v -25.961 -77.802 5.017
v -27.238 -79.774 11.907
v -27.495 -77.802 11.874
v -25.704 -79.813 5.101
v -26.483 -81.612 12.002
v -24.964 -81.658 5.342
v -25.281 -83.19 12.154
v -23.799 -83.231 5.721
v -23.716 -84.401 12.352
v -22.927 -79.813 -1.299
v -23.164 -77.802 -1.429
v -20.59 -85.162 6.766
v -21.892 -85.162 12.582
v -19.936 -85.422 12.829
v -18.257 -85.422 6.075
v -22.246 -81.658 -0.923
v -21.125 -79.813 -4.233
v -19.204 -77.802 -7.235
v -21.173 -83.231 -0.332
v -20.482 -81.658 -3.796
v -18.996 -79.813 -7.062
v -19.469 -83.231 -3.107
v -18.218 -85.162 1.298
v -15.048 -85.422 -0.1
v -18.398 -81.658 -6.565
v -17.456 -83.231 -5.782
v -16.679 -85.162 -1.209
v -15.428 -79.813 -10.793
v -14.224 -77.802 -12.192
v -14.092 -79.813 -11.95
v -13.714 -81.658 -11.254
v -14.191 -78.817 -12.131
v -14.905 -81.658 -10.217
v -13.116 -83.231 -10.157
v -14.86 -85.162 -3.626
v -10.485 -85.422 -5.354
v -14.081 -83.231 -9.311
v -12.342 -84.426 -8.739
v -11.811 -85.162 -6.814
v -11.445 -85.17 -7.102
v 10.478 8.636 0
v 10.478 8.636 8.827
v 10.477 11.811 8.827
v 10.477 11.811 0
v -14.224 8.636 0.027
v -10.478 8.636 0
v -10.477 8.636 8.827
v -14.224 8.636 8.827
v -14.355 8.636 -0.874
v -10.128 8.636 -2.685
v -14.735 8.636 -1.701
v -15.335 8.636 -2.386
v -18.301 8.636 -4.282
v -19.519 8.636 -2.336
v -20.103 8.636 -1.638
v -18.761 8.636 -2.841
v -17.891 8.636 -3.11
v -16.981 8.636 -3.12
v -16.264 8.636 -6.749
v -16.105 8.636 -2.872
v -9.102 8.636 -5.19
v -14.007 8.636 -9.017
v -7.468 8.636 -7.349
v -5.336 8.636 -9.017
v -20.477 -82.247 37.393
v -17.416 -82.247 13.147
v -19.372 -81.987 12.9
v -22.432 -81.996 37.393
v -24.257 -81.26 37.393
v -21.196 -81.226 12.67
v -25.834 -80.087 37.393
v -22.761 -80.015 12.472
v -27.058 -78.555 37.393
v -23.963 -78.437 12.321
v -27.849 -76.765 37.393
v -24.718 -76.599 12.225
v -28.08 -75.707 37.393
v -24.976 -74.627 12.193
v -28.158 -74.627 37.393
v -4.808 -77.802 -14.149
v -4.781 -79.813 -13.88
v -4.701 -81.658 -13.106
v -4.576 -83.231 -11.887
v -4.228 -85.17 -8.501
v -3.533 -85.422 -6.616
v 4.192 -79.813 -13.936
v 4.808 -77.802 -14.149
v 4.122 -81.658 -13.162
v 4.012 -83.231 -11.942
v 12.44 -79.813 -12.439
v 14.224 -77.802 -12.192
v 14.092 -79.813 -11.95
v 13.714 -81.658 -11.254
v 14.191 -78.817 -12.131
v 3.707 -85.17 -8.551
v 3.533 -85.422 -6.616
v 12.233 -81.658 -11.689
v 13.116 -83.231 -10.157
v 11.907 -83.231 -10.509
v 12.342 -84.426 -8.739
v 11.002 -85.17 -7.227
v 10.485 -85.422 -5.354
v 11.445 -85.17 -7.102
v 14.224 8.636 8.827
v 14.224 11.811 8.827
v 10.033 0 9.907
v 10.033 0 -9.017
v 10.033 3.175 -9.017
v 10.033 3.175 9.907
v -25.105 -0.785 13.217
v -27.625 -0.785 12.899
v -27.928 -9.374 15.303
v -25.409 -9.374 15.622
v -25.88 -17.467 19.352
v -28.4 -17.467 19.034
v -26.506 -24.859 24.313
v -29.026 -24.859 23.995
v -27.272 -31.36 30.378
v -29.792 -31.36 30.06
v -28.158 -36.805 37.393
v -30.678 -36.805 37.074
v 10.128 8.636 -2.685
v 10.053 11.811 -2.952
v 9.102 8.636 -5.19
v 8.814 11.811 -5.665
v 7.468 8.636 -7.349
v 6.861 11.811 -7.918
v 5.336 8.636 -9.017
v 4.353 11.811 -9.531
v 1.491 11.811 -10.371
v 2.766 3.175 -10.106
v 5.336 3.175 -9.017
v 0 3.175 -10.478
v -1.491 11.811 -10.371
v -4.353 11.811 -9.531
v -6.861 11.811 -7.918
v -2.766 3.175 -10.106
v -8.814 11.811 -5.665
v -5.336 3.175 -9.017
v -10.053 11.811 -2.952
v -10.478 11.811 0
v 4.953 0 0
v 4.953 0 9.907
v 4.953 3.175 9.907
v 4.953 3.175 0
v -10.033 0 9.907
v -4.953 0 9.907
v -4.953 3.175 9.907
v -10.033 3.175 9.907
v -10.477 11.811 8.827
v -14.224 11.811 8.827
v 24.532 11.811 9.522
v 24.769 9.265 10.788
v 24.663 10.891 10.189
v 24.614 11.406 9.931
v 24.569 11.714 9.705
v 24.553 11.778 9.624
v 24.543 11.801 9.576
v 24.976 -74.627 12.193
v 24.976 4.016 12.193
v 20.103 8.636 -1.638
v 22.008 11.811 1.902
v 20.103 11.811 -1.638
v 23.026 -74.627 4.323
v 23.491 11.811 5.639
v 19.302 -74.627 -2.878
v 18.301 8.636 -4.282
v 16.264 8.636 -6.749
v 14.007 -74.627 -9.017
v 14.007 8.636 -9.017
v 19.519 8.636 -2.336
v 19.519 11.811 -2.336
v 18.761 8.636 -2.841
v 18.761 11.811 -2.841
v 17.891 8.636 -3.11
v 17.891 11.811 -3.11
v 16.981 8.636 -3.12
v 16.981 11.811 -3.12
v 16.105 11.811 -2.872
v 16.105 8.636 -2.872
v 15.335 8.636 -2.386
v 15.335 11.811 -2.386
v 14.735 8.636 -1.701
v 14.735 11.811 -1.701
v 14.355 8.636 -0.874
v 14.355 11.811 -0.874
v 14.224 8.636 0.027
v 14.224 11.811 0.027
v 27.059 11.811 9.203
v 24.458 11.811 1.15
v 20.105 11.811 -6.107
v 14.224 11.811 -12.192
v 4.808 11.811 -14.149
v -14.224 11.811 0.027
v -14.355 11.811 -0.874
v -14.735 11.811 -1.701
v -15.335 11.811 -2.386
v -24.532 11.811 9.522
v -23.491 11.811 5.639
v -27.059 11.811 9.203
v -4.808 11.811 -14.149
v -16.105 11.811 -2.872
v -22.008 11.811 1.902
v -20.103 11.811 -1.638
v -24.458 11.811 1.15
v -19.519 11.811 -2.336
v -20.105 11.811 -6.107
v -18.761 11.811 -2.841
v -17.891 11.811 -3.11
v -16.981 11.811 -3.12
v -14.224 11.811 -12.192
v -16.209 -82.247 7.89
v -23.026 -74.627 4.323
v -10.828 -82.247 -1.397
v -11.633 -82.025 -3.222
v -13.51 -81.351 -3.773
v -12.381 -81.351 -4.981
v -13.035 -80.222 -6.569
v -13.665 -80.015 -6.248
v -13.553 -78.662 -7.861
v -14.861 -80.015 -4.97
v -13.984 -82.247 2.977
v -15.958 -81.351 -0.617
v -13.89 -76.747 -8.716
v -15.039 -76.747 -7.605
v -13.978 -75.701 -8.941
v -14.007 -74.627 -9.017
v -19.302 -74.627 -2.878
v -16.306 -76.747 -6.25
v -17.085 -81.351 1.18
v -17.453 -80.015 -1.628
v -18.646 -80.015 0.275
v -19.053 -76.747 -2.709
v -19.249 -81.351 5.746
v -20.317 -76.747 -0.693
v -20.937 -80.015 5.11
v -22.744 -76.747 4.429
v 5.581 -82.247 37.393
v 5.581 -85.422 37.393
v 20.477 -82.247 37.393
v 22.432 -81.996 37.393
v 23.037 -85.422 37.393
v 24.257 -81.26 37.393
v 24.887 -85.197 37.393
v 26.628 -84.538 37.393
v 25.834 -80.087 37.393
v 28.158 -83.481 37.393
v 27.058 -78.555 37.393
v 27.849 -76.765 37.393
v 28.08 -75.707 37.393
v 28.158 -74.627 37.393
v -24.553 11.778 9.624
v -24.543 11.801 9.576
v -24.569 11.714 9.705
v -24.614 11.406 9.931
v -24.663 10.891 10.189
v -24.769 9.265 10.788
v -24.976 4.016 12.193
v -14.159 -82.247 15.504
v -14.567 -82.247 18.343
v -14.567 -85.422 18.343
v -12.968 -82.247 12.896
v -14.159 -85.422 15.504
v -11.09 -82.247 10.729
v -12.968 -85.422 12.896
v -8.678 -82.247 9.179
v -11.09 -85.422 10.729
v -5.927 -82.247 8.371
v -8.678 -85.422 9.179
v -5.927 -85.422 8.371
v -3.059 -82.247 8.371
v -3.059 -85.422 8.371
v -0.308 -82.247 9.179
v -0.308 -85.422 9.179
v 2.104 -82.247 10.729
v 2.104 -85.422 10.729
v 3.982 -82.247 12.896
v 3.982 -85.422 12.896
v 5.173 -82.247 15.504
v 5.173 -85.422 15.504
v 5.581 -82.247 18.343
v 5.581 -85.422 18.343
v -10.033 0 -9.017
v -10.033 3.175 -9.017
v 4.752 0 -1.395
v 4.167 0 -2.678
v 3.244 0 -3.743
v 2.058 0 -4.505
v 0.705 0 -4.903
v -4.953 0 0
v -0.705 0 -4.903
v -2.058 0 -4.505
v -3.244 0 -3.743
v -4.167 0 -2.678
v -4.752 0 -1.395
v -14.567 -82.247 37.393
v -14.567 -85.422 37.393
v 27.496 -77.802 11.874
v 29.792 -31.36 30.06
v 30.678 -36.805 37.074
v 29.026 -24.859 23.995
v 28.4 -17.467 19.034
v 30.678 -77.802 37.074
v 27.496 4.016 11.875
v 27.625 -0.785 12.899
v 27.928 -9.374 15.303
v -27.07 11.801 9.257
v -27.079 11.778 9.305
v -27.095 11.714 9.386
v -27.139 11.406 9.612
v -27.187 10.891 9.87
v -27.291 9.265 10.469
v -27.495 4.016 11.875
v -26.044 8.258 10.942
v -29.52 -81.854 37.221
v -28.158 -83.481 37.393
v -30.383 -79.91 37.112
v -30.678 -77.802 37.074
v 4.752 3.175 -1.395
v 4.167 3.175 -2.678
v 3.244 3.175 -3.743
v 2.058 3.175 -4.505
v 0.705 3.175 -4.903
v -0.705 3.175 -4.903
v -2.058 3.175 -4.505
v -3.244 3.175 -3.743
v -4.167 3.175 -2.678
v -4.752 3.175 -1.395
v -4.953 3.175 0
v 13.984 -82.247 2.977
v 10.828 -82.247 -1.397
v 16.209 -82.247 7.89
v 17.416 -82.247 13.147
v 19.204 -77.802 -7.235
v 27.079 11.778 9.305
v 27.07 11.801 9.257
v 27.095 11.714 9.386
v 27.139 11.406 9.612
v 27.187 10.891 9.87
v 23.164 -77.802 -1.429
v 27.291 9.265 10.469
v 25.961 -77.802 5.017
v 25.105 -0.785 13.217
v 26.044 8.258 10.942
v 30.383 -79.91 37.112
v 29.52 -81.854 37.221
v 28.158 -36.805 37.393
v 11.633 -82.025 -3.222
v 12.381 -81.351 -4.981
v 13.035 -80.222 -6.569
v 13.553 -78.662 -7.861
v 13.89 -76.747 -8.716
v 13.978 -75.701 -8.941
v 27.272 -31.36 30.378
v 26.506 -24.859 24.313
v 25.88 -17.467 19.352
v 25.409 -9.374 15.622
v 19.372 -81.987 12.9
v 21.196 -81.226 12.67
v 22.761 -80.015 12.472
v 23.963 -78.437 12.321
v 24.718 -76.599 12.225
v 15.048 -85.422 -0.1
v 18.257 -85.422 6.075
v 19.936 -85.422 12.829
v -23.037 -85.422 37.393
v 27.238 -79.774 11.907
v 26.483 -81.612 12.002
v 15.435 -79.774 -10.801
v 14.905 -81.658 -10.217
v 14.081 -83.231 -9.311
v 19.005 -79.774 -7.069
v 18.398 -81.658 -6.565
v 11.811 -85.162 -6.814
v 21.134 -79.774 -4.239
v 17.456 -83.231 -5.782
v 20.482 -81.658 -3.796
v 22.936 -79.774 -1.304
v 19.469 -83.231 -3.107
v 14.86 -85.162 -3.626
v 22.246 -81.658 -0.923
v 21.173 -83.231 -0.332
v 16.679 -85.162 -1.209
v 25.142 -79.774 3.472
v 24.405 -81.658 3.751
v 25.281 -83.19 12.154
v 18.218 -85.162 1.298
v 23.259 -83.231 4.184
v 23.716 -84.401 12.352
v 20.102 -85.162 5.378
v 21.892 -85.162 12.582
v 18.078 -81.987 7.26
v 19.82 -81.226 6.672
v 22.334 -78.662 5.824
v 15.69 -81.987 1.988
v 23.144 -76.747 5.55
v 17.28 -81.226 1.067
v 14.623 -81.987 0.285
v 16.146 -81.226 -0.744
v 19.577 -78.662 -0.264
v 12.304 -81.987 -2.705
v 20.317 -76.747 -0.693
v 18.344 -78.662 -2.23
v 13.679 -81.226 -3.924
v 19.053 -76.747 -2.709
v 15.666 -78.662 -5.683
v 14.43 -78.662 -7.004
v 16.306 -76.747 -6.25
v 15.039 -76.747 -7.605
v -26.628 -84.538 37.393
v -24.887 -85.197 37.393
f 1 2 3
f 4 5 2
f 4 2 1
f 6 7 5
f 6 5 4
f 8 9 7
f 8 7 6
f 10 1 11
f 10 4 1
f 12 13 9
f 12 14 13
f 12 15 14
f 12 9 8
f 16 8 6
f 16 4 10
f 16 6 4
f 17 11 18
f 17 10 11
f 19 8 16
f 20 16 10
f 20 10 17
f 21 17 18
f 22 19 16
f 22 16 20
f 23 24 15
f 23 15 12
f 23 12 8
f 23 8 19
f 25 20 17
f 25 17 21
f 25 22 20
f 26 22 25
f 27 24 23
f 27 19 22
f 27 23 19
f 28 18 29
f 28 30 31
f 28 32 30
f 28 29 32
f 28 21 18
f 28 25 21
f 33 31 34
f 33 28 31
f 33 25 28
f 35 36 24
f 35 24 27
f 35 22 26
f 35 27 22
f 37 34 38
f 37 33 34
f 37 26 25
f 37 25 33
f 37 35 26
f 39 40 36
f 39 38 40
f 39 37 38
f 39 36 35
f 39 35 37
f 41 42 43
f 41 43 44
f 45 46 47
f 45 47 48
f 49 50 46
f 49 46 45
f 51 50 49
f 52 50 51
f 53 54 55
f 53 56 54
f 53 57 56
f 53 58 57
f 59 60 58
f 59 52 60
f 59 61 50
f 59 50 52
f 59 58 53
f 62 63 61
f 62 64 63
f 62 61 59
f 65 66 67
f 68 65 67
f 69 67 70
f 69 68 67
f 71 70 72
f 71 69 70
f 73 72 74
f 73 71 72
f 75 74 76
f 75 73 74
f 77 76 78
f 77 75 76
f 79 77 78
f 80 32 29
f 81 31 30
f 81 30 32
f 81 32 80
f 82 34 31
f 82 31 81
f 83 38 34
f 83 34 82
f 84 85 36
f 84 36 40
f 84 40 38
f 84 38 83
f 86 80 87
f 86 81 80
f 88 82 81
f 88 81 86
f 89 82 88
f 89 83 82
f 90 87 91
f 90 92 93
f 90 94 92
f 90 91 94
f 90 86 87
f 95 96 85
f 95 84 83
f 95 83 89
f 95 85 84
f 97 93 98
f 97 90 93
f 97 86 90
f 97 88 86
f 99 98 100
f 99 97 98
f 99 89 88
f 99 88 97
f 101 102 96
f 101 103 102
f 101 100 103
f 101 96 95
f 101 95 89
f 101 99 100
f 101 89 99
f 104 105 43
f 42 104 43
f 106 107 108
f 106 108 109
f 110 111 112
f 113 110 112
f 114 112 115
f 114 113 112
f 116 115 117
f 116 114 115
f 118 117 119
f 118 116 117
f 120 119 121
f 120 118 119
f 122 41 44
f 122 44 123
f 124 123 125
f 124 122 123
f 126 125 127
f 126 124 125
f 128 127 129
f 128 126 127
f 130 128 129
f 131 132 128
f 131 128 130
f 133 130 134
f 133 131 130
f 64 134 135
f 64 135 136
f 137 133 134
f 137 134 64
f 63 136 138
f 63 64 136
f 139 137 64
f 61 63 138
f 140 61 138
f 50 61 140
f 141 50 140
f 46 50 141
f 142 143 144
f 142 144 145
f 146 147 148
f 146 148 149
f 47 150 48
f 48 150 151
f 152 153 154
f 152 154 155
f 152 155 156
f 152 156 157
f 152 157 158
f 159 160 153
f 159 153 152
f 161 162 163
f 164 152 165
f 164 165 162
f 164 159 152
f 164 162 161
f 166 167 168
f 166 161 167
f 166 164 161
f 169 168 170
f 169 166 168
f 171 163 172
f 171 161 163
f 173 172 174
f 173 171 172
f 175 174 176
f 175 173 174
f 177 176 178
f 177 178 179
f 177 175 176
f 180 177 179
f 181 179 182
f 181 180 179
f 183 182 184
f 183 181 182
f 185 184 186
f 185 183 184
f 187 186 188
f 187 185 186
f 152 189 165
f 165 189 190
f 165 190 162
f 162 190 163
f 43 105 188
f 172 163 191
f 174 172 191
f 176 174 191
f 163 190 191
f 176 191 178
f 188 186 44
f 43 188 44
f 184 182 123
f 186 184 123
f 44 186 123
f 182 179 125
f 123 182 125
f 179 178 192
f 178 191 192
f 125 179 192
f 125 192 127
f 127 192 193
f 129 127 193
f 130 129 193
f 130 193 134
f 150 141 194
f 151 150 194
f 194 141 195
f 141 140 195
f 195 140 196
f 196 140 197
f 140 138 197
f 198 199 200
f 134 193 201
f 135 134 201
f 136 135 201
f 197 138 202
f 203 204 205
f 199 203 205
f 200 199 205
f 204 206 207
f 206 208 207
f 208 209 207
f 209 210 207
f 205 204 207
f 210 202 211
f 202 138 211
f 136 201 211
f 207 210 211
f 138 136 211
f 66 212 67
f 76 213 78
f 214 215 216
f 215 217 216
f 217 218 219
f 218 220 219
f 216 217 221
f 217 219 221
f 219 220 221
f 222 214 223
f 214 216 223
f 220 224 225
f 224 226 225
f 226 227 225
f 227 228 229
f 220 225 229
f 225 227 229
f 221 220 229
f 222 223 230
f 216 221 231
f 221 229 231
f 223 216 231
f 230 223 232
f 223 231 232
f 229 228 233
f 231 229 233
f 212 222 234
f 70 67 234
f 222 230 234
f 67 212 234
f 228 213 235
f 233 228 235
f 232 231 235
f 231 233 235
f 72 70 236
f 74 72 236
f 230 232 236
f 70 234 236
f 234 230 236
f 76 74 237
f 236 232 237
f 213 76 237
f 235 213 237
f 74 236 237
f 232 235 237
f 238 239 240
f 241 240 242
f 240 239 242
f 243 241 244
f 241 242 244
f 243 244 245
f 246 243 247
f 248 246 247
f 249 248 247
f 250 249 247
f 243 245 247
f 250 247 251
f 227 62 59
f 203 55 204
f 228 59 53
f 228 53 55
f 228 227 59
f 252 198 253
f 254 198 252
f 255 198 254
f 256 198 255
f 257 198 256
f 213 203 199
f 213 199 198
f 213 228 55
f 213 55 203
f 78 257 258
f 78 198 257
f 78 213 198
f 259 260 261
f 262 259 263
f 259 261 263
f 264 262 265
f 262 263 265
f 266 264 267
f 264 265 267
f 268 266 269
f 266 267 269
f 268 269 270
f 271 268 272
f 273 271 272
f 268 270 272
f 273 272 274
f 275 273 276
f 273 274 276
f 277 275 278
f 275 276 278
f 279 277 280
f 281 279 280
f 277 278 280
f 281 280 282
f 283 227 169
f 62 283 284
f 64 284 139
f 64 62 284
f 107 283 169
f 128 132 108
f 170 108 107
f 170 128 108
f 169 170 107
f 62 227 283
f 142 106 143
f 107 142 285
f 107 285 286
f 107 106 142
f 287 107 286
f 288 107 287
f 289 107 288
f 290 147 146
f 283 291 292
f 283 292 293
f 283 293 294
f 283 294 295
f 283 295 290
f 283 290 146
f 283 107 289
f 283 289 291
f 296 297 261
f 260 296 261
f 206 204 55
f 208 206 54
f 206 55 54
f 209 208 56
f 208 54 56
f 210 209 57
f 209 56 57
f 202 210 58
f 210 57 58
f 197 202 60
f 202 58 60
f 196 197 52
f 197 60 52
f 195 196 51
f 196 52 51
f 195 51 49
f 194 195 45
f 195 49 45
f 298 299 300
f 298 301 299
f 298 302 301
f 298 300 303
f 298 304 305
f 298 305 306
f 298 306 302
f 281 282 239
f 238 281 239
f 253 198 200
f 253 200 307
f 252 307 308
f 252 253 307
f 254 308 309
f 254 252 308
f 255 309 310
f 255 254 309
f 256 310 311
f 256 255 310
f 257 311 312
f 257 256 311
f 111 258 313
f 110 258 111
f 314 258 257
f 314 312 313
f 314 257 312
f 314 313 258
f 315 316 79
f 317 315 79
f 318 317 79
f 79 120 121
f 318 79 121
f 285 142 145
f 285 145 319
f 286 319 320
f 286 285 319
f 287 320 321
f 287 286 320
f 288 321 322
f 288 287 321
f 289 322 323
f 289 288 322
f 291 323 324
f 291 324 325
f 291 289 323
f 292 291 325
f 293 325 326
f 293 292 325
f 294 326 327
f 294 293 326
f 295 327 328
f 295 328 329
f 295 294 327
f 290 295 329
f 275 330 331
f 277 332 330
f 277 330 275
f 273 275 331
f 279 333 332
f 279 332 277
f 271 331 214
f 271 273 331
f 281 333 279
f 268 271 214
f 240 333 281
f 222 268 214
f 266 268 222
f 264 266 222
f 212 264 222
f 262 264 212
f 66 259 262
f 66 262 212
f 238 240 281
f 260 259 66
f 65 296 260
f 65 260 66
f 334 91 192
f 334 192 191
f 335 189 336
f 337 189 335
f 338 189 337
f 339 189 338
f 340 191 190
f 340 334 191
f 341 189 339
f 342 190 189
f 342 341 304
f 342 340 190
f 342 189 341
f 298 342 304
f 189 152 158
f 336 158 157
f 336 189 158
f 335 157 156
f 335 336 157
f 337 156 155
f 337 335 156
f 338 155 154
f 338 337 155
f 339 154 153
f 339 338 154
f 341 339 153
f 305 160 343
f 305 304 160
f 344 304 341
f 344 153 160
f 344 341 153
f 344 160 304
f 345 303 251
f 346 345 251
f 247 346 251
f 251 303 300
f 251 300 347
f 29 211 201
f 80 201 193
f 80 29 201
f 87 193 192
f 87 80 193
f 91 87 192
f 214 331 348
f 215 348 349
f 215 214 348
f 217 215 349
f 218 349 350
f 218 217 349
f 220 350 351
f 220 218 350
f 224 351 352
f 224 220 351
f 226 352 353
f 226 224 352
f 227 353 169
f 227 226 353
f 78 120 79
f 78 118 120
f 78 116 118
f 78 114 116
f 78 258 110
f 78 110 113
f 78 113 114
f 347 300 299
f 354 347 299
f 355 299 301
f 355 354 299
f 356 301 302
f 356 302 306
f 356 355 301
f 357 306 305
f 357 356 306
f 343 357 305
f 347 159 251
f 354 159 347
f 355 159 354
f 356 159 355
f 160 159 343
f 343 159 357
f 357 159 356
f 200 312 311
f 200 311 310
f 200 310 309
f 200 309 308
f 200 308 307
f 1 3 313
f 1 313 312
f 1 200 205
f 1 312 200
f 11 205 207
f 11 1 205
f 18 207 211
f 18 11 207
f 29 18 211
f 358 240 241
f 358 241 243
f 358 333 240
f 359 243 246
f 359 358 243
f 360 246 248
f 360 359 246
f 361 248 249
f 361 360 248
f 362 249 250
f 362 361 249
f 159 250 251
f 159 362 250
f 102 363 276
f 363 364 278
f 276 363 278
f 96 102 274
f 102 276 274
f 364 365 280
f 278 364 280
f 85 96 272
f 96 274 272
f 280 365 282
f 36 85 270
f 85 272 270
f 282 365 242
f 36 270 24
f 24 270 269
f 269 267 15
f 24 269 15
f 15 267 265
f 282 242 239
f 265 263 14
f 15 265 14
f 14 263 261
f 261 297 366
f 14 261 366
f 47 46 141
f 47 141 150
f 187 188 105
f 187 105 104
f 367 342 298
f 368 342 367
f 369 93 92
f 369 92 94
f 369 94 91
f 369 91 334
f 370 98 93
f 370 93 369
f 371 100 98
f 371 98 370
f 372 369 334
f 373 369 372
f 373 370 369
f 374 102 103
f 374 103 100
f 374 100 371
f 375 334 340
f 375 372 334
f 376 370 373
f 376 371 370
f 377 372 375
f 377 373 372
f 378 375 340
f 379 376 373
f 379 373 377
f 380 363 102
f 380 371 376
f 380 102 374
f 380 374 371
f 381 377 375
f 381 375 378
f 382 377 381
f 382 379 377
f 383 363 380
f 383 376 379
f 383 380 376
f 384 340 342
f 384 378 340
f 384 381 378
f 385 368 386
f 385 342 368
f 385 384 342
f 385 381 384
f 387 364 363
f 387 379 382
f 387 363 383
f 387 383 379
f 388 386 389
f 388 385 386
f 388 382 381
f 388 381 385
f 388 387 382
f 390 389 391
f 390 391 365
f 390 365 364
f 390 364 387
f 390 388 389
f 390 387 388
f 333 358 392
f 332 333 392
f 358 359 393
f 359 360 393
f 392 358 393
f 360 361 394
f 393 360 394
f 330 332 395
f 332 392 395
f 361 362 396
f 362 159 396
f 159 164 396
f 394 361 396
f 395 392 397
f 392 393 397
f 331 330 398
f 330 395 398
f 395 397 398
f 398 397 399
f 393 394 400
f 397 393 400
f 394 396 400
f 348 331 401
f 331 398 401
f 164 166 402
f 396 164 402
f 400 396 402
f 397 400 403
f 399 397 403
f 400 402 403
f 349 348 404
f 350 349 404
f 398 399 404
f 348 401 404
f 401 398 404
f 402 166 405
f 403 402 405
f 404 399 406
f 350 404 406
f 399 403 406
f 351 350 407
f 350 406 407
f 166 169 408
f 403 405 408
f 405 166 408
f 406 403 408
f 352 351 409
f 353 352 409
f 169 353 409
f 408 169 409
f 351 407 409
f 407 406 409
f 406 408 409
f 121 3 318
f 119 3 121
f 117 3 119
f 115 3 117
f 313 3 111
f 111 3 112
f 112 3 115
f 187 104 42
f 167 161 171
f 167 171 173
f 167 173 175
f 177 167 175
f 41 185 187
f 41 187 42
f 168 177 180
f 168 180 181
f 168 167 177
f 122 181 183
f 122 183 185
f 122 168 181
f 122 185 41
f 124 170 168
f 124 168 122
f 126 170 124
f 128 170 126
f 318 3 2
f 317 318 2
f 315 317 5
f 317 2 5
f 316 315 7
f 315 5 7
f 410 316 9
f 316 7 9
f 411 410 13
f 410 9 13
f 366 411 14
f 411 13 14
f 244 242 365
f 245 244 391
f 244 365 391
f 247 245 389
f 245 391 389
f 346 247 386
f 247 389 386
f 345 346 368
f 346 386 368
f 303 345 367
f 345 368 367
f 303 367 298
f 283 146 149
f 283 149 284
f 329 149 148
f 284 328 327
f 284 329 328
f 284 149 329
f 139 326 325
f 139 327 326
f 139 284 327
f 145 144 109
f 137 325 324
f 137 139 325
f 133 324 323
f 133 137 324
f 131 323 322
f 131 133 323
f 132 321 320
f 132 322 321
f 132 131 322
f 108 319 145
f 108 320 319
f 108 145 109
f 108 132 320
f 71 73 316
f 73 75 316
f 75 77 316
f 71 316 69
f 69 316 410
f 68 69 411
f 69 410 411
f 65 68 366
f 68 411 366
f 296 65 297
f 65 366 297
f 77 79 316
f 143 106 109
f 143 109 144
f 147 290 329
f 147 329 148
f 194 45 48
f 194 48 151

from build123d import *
from build123d.topology import SkipClean

# Parameters (mm, degrees)
BOSS_EXTRUDE1_DEPTH     = 3.175
BOSS_EXTRUDE2_DEPTH     = 3.175
BOSS_EXTRUDE3_DEPTH     = 21.0185
CUT_EXTRUDE1_START      = -8.636
CUT_EXTRUDE1_DEPTH      = 8.636
EXTRUDE_THIN2_START     = -97.232746
EXTRUDE_THIN2_DEPTH     = 97.232746
FILLET3_R               = 3.175
BOSS_EXTRUDE6_DEPTH     = 3.175
BOSS_EXTRUDE7_DEPTH     = 25.4
BOSS_EXTRUDE8_DEPTH     = 25.4
CUT_EXTRUDE2_START      = -2.540011
CUT_EXTRUDE2_DEPTH      = 2.540011
CUT_EXTRUDE3_DEPTH      = 111.05910553505677
CUT_EXTRUDE3_DEPTH_BACK = 10.921999999999981
BOSS_EXTRUDE10_DEPTH    = 3.175
CUT_EXTRUDE6_DEPTH      = 3.175
FILLET9_R               = 7.62
FILLET10_R              = 7.62


with BuildPart() as part:
    # Sketch1 → Boss-Extrude1 (new body)
    with BuildSketch(Plane(origin=(0, 0, 0), x_dir=(1, 0, 0), z_dir=(0, 1, 0))):
        with BuildLine():
            Line((-7.493000000000001, 9.017), (7.493000000000001, 9.017))
            Line((7.493000000000001, 9.017), (10.033000000000001, 9.017))
            Line((10.033000000000001, 9.017), (10.033000000000003, -9.907244149147685))
            Line((10.033000000000003, -9.907244149147685), (7.493000000000001, -9.907244149147685))
            Line((7.493000000000001, -9.907244149147685), (4.953000000000001, -9.907244149147685))
            Line((4.953000000000001, -9.907244149147685), (4.953000000000001, -7.493000000000001))
            Line((4.953000000000001, -7.493000000000001), (4.953000000000002, 0))
            ThreePointArc((4.953000000000002, 0), (3e-16, 4.953000000000002), (-4.953000000000002, 0))
            Line((-4.953000000000002, 0), (-4.953000000000002, -7.493000000000001))
            Line((-4.953000000000002, -7.493000000000001), (-4.953000000000002, -9.907244149147685))
            Line((-4.953000000000002, -9.907244149147685), (-7.493000000000001, -9.907244149147685))
            Line((-7.493000000000001, -9.907244149147685), (-10.033, -9.907244149147685))
            Line((-10.033, -9.907244149147685), (-10.033, 9.017))
            Line((-10.033, 9.017), (-7.493000000000001, 9.017))
        make_face()
    extrude(amount=BOSS_EXTRUDE1_DEPTH)

    # Sketch2 → Boss-Extrude2 (add)
    with BuildSketch(Plane(origin=(0, 0, -9.017), x_dir=(-1, 0, 0), z_dir=(0, 0, -1))):
        Polygon((-14.224, 11.811000000000002), (14.224, 11.810999999999998), (14.224000000000013, -85.42174573001641), (-14.224, -85.42174573001641), align=None)
    extrude(amount=BOSS_EXTRUDE2_DEPTH)

    # Sketch6 → Boss-Extrude3 (add)
    with BuildSketch(Plane.XY.offset(-12.191999999999998)):
        Polygon((-14.224000000000013, 11.810999999999998), (14.224000000000002, 11.811000000000002), (14.224000000000002, 8.635999999999997), (-14.224000000000013, 8.636), align=None)
    extrude(amount=BOSS_EXTRUDE3_DEPTH)

    # Sketch7 → Cut-Extrude1 (cut)
    with BuildSketch(Plane(origin=(-1.44e-15, 11.811, 0), x_dir=(1, 1.2e-16, -1.2e-16), z_dir=(-1.2e-16, 1, 0)).offset(CUT_EXTRUDE1_START)):
        with BuildLine():
            Line((-10.4775, 0), (-10.477499999999997, -8.826500000000003))
            Line((-10.477499999999997, -8.826500000000003), (10.477499999999997, -8.826500000000003))
            Line((10.477499999999997, -8.826500000000003), (10.4775, 0))
            ThreePointArc((10.4775, 0), (6.4e-16, 10.4775), (-10.4775, 0))
        make_face()
    extrude(amount=CUT_EXTRUDE1_DEPTH, mode=Mode.SUBTRACT)

    # Sketch9 → Extrude-Thin2 (add)
    with SkipClean():  # the faces are left unmerged after this step: merging them gives an invalid solid
        with BuildSketch(Plane(origin=(-1.44e-15, 11.811, 0), x_dir=(1, 1.2e-16, 0), z_dir=(-1.2e-16, 1, 0)).offset(EXTRUDE_THIN2_START)):
            with BuildLine():
                ThreePointArc((-27.495499999999996, -11.874500000000001), (-23.16361739518542, 1.4292204105375994), (-14.223999999999998, 12.191999999999998))
                ThreePointArc((-14.223999999999998, 12.191999999999998), (5.6e-15, 14.3950225515744), (14.224000000000002, 12.191999999999998))
                ThreePointArc((14.224000000000002, 12.191999999999998), (23.163617395185135, 1.4292204105374466), (27.495500000000003, -11.874500000000001))
                Line((27.495500000000003, -11.874500000000001), (24.975514198736292, -12.192731930247863))
                ThreePointArc((24.975514198736292, -12.192731930247863), (21.05665610983997, -0.0117588049320041), (12.985378631165648, 9.917391957485702))
                ThreePointArc((12.985378631165648, 9.917391957485702), (-2.419e-14, 11.8550225515744), (-12.985378631165693, 9.917391957485693))
                ThreePointArc((-12.985378631165693, 9.917391957485693), (-21.05665610984024, -0.01175880493180514), (-24.97551419873627, -12.192731930247744))
                Line((-24.97551419873627, -12.192731930247744), (-27.495499999999996, -11.874500000000001))
            make_face()
        extrude(amount=EXTRUDE_THIN2_DEPTH)

    # Fillet3
    fillet3_edges = [part.edges().sort_by_distance(p)[0] for p in [
        (14.223999999999988, 10.223500000000001, -8.81669380630742),
        (-14.224000000000025, 10.223500000000001, -8.81669380630752),
    ]]
    fillet(fillet3_edges, radius=FILLET3_R)

    # Sketch14 → Boss-Extrude6 (add)
    with SkipClean():  # the faces are left unmerged after this step: merging them gives an invalid solid
        with BuildSketch(Plane.XZ.offset(85.42174573001641)):
            with BuildLine():
                Line((-24.97551419873624, 12.192731930247724), (24.975514198736285, 12.19273193024785))
                ThreePointArc((24.975514198736285, 12.19273193024785), (21.375415433357674, 0.6135941010343018), (14.007321972391798, -9.017000000000001))
                Line((14.007321972391798, -9.017000000000001), (-14.007321972391907, -9.017000000000001))
                ThreePointArc((-14.007321972391907, -9.017000000000001), (-21.3754154333579, 0.613594101034149), (-24.97551419873624, 12.192731930247724))
            make_face()
        extrude(amount=-BOSS_EXTRUDE6_DEPTH)

    # Sketch16 → Boss-Extrude7 (add)
    with SkipClean():  # the faces are left unmerged after this step: merging them gives an invalid solid
        with BuildSketch(Plane(origin=(-1.907611771170577, -2.3e-16, 15.10582100900744), x_dir=(0.9921203941983182, 1.3600232051658164e-15, 0.125288161514861), z_dir=(-0.125288161514861, 0, 0.9921203941983182))):
            Polygon((-25.79111202477162, 11.811000000000032), (-23.25111202477174, 11.811000000000032), (-23.25111202477173, -85.42174573001638), (-25.791112024771614, -85.42174573001638), align=None)
        extrude(amount=BOSS_EXTRUDE7_DEPTH)

    # Sketch17 → Boss-Extrude8 (add)
    with SkipClean():  # the faces are left unmerged after this step: merging them gives an invalid solid
        with BuildSketch(Plane(origin=(1.9076117711714262, 2.3e-16, 15.105821009008544), x_dir=(0.9921203941983123, 0, -0.12528816151490688), z_dir=(0.12528816151490688, 0, 0.9921203941983123))):
            Polygon((23.251112024770936, 11.811000000000003), (25.791112024770936, 11.811000000000003), (25.791112024770946, -85.42174573001641), (23.251112024770947, -85.42174573001641), align=None)
        extrude(amount=BOSS_EXTRUDE8_DEPTH)

    # Sketch18 → Cut-Extrude2 (cut)
    with SkipClean():  # the faces are left unmerged after this step: merging them gives an invalid solid
        with BuildSketch(Plane(origin=(25.587888228828575, 2.68e-15, -3.2313210090085582), x_dir=(-0.12528816151490693, 0, -0.9921203941983123), z_dir=(0.9921203941983123, 0, -0.12528816151490693)).offset(CUT_EXTRUDE2_START)):
            with BuildLine():
                Line((-15.225794265840976, 11.811000000000003), (-40.62579426584097, 11.810999999999979))
                Line((-40.62579426584097, 11.810999999999979), (-40.625794265840945, -36.80537286500823))
                ThreePointArc((-40.625794265840945, -36.80537286500823), (-21.550219024017473, -15.828155025985357), (-15.225794265840976, 11.811000000000003))
            make_face()
        extrude(amount=CUT_EXTRUDE2_DEPTH, mode=Mode.SUBTRACT)

    # Sketch20 → Cut-Extrude3 (cut, two sides: drawn at the far end of the back side and taken through both)
    with SkipClean():  # the faces are left unmerged after this step: merging them gives an invalid solid
        with BuildSketch(Plane(origin=(-25.58788822882942, -3.721e-14, -3.2313210090074618), x_dir=(-0.125288161514861, 0, 0.9921203941983182), z_dir=(-0.9921203941983182, -1.4485191631463195e-15, -0.125288161514861)).offset(-CUT_EXTRUDE3_DEPTH_BACK)):
            with BuildLine():
                Line((22.0274881860901, 227.29057678360587), (15.225794265839772, 11.811000000000037))
                ThreePointArc((15.225794265839772, 11.811000000000037), (21.550219024016272, -15.828155025985314), (40.62579426583977, -36.8053728650082))
                Line((40.62579426583977, -36.8053728650082), (221.38768427622742, -154.29090461636542))
                Line((221.38768427622742, -154.29090461636542), (603.5471555949496, 45.37126677696938))
                Line((603.5471555949496, 45.37126677696938), (404.18695950481225, 426.95274817694064))
                Line((404.18695950481225, 426.95274817694064), (22.0274881860901, 227.29057678360587))
            make_face()
        extrude(amount=CUT_EXTRUDE3_DEPTH + CUT_EXTRUDE3_DEPTH_BACK, mode=Mode.SUBTRACT)

    # Fillet4
    # an asymmetric fillet: 13.335, 3.81 mm, written as the material it takes off along each edge
    with BuildSketch(Plane(origin=(58.84302061341704, 11.811000000000007, 7.915834047084794), x_dir=(-0.12528816151490632, 0, -0.9921203941983124), z_dir=(-0.9921203941983124, 0, 0.12528816151490632))) as fillet4_piece_1:
        with BuildLine():
            Bezier((2.7053520070494255, 0), (1.4569009522956595, 0), (-1.0323629375475052, 12.596361392197306), weights=[1, 0.7726151697313755, 1])
            ThreePointArc((-1.0323629375475052, 12.596361392197306), (-0.15891459016591844, 6.327461301251529), (0, 0))
            Line((0, 0), (2.7053520070494255, 0))
        make_face()
    extrude(amount=65.73297697483088, mode=Mode.SUBTRACT)
    with BuildSketch(Plane(origin=(6.372006414680967, 11.811, 16.151397883161476), x_dir=(0.12528816151485953, 0, -0.9921203941983183), z_dir=(-0.9921203941983183, 0, -0.12528816151485953))) as fillet4_piece_2:
        with BuildLine():
            Bezier((2.7053520070494144, 0), (1.4569009522956617, 0), (-1.0323629375475112, 12.596361392197299), weights=[1, 0.7726151697313756, 1])
            ThreePointArc((-1.0323629375475112, 12.596361392197299), (-0.1589145901659224, 6.327461301251536), (0, 0))
            Line((0, 0), (2.7053520070494144, 0))
        make_face()
    extrude(amount=65.7329769748309, mode=Mode.SUBTRACT)

    # Sketch24 → Boss-Extrude10 (add)
    with SkipClean():  # the faces are left unmerged after this step: merging them gives an invalid solid
        with BuildSketch(Plane.XZ.offset(85.42174573001641)):
            Polygon((-28.15783350121368, 37.39258994288504), (28.157833501214938, 37.392589942884996), (24.975514198736303, 12.192731930247856), (-24.975514198736246, 12.192731930247751), align=None)
        extrude(amount=-BOSS_EXTRUDE10_DEPTH)

    # Sketch26 → Cut-Extrude6 (cut)
    with SkipClean():  # the faces are left unmerged after this step: merging them gives an invalid solid
        with BuildSketch(Plane.XZ.offset(85.42174573001641)):
            with BuildLine():
                Line((-14.567389511213682, 37.392589942884996), (-14.56738951121368, 18.342589942884995))
                ThreePointArc((-14.56738951121368, 18.342589942884995), (-13.658413539575372, 14.16066011195614), (-11.095512732064424, 10.733370529984954))
                ThreePointArc((-11.095512732064424, 10.733370529984954), (-0.31106002656321863, 9.177166260801702), (5.581409796229526, 18.342589942884995))
                Line((5.581409796229526, 18.342589942884995), (5.581409796229526, 37.392589942884996))
                Line((5.581409796229526, 37.392589942884996), (-14.567389511213682, 37.392589942884996))
            make_face()
        extrude(amount=-CUT_EXTRUDE6_DEPTH, mode=Mode.SUBTRACT)

    # Fillet9
    # the kernel refuses this fillet: 7.62 mm, written as the material it takes off along each edge
    with BuildSketch(Plane(origin=(-27.49549999999986, -85.42174573001641, 11.8745), x_dir=(-1.4e-15, 1, -2.2e-16), z_dir=(-0.12528816151486097, 0, 0.9921203941983181))) as fillet9_piece_1:
        with BuildLine():
            CenterArc((FILLET9_R, -FILLET9_R), FILLET9_R, 90.00000000000003, 90)
            Line((3.41e-15, -FILLET9_R), (0, 0))
            Line((0, 0), (FILLET9_R, 0))
        make_face()
    extrude(amount=44.45000000000002, mode=Mode.SUBTRACT)
    with BuildSketch(Plane(origin=(9.413541961032127, -85.42174600000001, 16.535492796453063), x_dir=(-0.9921203941983183, 0, -0.12528816151485989), z_dir=(-0.12528816151485989, 0, 0.9921203941983183))) as fillet9_piece_2:
        with BuildLine():
            CenterArc((37.20218047816306 - FILLET9_R, -FILLET9_R), FILLET9_R, 0, 89.99999999999997)
            Line((37.20218047816306 - FILLET9_R, 0), (37.20218047816306, 0))
            Line((37.20218047816306, 0), (37.20218047816306, -FILLET9_R))
        make_face()
    revolve(axis=Axis((9.413541961032127, -85.42174600000001, 16.535492796453063), (1.2e-16, -1, 0)), revolution_arc=72.69638640364694, mode=Mode.SUBTRACT)
    with BuildSketch(Plane(origin=(1.219e-14, -85.42174600000001, 32.62571362170871), x_dir=(-0.6537161623893962, 0, -0.7567398357631774), z_dir=(-0.7567398357631774, 0, 0.6537161623893962))) as fillet9_piece_3:
        with BuildLine():
            CenterArc((47.020736173283105 - FILLET9_R, -FILLET9_R), FILLET9_R, 0, 90.00000000000006)
            Line((47.020736173283105 - FILLET9_R, 0), (47.020736173283105, 0))
            Line((47.020736173283105, 0), (47.02073617328311, -FILLET9_R))
        make_face()
    revolve(axis=Axis((1.219e-14, -85.42174600000001, 32.62571362170871), (1.2e-16, -1, 0)), revolution_arc=81.64474825482282, mode=Mode.SUBTRACT)
    with BuildSketch(Plane(origin=(-9.4135419610362, -85.42174600000001, 16.53549279645533), x_dir=(0.17547354297009532, 0, -0.984484147011785), z_dir=(-0.984484147011785, 0, -0.17547354297009532))) as fillet9_piece_4:
        with BuildLine():
            CenterArc((37.202180478167406 - FILLET9_R, -FILLET9_R), FILLET9_R, 0, 90)
            Line((37.202180478167406 - FILLET9_R, 0), (37.202180478167406, 0))
            Line((37.202180478167406, 0), (37.202180478167406, -FILLET9_R))
        make_face()
    revolve(axis=Axis((-9.4135419610362, -85.42174600000001, 16.53549279645533), (1.2e-16, -1, 0)), revolution_arc=72.69638640363817, mode=Mode.SUBTRACT)
    with BuildSketch(Plane(origin=(27.49550000000001, -85.42174573001641, 11.874499999999987), x_dir=(-4.6e-16, 1, 3e-17), z_dir=(0.12528816151490688, 0, 0.9921203941983123))) as fillet9_piece_5:
        with BuildLine():
            CenterArc((FILLET9_R, FILLET9_R), FILLET9_R, 179.99999999999994, 90)
            Line((1.774e-14, FILLET9_R), (0, 0))
            Line((0, 0), (FILLET9_R, 0))
        make_face()
    extrude(amount=44.450000000000045, mode=Mode.SUBTRACT)

    # Fillet10
    fillet10_edges = [part.edges().sort_by_distance(p)[0] for p in [
        (21.37541543335767, -82.24674573001641, 0.6135941010343018),
        (-26.566673849974965, -82.24674573001641, 24.792660936566392),
        (-21.3754154333579, -82.24674573001641, 0.6135941010341472),
        (-5.507e-14, -82.24674573001641, -9.017000000000001),
        (26.56667384997562, -82.24674573001641, 24.792660936566424),
    ]]
    fillet(fillet10_edges, radius=FILLET10_R)


solid = part.part
